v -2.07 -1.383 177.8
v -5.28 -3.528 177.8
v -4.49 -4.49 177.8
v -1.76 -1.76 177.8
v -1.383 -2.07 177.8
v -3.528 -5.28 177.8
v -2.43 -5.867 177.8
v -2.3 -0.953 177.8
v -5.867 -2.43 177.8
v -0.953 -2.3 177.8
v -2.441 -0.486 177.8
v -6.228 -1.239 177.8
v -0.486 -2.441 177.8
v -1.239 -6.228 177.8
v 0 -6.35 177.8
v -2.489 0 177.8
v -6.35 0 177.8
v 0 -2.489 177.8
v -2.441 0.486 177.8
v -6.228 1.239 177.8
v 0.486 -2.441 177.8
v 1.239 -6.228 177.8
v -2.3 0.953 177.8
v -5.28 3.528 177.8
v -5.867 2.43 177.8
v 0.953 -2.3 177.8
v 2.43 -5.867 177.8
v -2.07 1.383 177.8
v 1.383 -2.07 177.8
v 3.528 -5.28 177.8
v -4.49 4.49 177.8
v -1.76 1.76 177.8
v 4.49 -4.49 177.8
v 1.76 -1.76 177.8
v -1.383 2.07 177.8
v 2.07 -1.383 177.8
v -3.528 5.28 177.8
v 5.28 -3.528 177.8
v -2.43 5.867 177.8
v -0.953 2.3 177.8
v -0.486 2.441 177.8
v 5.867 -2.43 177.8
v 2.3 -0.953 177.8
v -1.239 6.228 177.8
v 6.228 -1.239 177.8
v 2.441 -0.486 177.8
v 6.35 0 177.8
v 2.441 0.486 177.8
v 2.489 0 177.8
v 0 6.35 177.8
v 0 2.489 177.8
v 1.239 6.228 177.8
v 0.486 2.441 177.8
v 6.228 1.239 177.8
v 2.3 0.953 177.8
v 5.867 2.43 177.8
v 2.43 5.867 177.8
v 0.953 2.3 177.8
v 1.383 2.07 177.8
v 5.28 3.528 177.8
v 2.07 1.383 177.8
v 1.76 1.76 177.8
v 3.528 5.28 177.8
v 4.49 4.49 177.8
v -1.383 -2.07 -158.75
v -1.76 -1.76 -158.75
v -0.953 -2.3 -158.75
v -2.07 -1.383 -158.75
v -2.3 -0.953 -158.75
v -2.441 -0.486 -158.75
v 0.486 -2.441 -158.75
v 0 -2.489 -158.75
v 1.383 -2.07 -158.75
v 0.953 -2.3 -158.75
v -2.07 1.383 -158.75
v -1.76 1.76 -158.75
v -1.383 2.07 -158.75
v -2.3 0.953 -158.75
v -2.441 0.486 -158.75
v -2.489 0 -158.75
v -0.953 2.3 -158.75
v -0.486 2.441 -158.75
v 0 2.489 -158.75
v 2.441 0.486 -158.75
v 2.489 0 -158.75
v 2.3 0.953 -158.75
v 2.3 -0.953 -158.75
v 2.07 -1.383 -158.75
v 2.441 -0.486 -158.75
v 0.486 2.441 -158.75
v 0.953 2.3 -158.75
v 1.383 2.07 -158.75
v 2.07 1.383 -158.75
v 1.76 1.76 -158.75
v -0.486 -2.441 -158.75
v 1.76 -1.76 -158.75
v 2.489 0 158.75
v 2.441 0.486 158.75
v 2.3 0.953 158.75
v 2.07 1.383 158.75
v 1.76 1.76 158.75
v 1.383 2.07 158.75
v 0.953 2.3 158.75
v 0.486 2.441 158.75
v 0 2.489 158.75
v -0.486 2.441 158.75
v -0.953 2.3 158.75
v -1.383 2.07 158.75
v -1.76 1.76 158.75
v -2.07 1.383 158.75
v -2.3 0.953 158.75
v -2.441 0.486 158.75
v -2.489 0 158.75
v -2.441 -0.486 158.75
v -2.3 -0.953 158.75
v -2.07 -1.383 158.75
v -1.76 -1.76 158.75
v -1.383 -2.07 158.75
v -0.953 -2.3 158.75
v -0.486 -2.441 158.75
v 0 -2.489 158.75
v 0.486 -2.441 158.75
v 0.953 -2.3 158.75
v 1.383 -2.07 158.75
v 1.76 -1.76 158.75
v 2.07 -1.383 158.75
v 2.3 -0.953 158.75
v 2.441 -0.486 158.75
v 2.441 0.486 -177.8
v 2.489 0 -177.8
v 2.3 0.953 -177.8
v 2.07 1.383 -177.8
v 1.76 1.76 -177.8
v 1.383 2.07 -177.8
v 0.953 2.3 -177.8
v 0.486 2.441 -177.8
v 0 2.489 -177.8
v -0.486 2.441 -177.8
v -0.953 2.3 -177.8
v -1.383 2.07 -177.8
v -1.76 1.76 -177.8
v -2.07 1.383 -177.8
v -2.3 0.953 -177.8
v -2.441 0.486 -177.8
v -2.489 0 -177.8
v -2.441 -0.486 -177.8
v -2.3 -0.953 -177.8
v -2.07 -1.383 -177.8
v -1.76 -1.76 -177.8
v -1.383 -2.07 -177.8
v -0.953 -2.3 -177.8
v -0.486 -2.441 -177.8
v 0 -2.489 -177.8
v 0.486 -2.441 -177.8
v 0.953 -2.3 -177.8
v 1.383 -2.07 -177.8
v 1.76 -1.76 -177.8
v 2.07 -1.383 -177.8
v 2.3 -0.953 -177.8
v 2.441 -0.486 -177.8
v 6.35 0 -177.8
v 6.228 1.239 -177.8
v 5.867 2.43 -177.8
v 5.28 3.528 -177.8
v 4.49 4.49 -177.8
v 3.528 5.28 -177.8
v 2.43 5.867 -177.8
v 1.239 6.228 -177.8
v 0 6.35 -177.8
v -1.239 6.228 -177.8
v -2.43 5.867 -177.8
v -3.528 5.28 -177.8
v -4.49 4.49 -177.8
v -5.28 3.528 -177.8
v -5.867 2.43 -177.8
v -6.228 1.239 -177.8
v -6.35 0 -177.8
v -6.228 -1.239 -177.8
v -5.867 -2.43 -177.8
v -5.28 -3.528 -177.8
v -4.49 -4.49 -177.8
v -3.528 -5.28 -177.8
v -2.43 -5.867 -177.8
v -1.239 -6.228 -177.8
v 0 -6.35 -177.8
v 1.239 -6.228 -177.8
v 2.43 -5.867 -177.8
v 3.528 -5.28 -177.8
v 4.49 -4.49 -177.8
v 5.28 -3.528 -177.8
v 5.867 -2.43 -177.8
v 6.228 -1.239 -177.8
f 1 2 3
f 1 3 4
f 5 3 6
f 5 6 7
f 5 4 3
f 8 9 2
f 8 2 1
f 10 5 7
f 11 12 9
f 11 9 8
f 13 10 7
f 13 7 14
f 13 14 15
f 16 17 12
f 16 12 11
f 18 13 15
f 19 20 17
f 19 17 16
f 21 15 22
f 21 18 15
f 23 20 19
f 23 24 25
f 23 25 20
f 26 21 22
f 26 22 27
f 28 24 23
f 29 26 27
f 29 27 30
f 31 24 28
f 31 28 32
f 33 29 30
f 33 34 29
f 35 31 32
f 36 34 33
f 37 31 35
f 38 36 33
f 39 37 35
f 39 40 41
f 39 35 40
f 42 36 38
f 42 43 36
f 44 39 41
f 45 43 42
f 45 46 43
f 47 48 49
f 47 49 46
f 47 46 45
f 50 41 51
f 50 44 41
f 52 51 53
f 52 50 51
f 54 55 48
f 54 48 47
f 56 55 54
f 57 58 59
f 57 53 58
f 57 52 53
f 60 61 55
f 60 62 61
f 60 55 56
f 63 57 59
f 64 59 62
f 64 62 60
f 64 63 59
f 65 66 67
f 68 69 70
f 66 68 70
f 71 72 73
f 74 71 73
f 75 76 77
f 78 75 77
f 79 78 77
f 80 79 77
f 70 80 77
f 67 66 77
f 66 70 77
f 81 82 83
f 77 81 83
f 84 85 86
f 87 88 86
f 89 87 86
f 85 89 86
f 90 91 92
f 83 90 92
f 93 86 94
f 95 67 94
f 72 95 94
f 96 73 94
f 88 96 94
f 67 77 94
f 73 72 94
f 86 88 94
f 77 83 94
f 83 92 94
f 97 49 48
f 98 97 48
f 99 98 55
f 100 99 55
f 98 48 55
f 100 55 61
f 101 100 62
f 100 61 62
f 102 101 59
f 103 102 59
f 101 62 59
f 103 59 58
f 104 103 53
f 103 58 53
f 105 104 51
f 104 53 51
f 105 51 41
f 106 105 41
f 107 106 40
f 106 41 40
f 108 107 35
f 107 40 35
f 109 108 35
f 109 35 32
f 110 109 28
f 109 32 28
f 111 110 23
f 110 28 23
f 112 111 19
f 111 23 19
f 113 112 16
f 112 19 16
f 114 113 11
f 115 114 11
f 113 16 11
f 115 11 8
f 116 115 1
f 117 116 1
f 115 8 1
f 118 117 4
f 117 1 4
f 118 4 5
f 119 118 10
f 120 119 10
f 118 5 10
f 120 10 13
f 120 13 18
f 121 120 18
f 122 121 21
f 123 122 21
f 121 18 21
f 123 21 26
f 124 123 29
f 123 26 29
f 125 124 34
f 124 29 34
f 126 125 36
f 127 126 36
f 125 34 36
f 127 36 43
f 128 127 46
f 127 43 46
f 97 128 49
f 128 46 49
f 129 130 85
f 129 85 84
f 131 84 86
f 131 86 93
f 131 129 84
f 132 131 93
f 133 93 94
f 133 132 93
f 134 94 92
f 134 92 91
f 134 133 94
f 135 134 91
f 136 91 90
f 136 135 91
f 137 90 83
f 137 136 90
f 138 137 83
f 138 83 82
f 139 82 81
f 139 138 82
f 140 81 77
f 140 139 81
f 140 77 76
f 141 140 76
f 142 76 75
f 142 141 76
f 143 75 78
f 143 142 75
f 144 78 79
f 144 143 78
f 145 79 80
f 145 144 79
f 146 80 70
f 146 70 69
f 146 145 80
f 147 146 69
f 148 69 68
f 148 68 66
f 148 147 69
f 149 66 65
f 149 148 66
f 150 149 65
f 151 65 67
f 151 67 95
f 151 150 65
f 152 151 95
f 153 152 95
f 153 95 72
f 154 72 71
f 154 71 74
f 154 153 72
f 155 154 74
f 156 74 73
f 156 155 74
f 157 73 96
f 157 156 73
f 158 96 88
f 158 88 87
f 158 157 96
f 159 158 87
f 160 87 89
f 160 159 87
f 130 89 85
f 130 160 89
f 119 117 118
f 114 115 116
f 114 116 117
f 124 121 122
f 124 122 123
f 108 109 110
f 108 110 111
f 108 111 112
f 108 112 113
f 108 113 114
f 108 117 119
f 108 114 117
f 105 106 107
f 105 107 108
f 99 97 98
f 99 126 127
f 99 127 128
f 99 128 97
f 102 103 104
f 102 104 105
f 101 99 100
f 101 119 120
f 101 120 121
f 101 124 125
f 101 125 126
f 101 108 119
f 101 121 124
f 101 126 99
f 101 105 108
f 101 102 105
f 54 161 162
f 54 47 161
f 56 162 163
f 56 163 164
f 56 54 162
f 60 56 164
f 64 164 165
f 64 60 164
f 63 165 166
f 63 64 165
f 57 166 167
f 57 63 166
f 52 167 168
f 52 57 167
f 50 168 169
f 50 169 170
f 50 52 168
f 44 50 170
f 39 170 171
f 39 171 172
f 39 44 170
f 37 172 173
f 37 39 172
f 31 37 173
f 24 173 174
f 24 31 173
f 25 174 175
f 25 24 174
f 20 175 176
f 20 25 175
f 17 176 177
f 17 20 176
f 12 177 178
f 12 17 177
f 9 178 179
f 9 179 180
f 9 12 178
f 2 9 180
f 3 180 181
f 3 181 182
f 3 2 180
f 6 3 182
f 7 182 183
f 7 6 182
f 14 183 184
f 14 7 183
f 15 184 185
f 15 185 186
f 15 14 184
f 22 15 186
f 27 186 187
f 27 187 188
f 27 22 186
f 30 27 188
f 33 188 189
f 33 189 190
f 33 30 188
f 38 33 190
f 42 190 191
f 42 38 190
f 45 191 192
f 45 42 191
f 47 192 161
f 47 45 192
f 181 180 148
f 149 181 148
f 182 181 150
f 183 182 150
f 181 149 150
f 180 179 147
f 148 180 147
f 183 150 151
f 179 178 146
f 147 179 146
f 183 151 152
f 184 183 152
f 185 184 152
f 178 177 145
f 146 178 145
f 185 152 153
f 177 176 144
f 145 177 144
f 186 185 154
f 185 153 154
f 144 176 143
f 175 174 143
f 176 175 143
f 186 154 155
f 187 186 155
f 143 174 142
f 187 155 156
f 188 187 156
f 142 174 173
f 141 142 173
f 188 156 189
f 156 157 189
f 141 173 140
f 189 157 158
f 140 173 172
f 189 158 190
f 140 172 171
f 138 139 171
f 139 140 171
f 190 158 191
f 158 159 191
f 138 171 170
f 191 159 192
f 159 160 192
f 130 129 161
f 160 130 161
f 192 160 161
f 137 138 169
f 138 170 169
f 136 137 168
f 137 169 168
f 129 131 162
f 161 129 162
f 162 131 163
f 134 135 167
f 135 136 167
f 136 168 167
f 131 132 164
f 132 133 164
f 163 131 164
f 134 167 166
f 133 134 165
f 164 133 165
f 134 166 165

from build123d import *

# Parameters (mm, degrees)
SKETCH1_R           = 6.35
BOSS_EXTRUDE1_DEPTH = 177.8
SKETCH3_R           = 2.4892
CUT_EXTRUDE1_DEPTH  = 19.05


with BuildPart() as part:
    # Sketch1 → Boss-Extrude1 (new, symmetric)
    with BuildSketch(Plane.XY):
        Circle(SKETCH1_R)
    extrude(amount=BOSS_EXTRUDE1_DEPTH, both=True)

    # Sketch3 → Cut-Extrude1 (cut)
    with BuildSketch(Plane.XY.offset(177.8)):
        Circle(SKETCH3_R)
    cut_extrude1 = extrude(amount=-CUT_EXTRUDE1_DEPTH, mode=Mode.SUBTRACT)

    # Mirror1: Cut-Extrude1 across plane
    add(cut_extrude1.mirror(Plane.XY), mode=Mode.SUBTRACT)


solid = part.part
